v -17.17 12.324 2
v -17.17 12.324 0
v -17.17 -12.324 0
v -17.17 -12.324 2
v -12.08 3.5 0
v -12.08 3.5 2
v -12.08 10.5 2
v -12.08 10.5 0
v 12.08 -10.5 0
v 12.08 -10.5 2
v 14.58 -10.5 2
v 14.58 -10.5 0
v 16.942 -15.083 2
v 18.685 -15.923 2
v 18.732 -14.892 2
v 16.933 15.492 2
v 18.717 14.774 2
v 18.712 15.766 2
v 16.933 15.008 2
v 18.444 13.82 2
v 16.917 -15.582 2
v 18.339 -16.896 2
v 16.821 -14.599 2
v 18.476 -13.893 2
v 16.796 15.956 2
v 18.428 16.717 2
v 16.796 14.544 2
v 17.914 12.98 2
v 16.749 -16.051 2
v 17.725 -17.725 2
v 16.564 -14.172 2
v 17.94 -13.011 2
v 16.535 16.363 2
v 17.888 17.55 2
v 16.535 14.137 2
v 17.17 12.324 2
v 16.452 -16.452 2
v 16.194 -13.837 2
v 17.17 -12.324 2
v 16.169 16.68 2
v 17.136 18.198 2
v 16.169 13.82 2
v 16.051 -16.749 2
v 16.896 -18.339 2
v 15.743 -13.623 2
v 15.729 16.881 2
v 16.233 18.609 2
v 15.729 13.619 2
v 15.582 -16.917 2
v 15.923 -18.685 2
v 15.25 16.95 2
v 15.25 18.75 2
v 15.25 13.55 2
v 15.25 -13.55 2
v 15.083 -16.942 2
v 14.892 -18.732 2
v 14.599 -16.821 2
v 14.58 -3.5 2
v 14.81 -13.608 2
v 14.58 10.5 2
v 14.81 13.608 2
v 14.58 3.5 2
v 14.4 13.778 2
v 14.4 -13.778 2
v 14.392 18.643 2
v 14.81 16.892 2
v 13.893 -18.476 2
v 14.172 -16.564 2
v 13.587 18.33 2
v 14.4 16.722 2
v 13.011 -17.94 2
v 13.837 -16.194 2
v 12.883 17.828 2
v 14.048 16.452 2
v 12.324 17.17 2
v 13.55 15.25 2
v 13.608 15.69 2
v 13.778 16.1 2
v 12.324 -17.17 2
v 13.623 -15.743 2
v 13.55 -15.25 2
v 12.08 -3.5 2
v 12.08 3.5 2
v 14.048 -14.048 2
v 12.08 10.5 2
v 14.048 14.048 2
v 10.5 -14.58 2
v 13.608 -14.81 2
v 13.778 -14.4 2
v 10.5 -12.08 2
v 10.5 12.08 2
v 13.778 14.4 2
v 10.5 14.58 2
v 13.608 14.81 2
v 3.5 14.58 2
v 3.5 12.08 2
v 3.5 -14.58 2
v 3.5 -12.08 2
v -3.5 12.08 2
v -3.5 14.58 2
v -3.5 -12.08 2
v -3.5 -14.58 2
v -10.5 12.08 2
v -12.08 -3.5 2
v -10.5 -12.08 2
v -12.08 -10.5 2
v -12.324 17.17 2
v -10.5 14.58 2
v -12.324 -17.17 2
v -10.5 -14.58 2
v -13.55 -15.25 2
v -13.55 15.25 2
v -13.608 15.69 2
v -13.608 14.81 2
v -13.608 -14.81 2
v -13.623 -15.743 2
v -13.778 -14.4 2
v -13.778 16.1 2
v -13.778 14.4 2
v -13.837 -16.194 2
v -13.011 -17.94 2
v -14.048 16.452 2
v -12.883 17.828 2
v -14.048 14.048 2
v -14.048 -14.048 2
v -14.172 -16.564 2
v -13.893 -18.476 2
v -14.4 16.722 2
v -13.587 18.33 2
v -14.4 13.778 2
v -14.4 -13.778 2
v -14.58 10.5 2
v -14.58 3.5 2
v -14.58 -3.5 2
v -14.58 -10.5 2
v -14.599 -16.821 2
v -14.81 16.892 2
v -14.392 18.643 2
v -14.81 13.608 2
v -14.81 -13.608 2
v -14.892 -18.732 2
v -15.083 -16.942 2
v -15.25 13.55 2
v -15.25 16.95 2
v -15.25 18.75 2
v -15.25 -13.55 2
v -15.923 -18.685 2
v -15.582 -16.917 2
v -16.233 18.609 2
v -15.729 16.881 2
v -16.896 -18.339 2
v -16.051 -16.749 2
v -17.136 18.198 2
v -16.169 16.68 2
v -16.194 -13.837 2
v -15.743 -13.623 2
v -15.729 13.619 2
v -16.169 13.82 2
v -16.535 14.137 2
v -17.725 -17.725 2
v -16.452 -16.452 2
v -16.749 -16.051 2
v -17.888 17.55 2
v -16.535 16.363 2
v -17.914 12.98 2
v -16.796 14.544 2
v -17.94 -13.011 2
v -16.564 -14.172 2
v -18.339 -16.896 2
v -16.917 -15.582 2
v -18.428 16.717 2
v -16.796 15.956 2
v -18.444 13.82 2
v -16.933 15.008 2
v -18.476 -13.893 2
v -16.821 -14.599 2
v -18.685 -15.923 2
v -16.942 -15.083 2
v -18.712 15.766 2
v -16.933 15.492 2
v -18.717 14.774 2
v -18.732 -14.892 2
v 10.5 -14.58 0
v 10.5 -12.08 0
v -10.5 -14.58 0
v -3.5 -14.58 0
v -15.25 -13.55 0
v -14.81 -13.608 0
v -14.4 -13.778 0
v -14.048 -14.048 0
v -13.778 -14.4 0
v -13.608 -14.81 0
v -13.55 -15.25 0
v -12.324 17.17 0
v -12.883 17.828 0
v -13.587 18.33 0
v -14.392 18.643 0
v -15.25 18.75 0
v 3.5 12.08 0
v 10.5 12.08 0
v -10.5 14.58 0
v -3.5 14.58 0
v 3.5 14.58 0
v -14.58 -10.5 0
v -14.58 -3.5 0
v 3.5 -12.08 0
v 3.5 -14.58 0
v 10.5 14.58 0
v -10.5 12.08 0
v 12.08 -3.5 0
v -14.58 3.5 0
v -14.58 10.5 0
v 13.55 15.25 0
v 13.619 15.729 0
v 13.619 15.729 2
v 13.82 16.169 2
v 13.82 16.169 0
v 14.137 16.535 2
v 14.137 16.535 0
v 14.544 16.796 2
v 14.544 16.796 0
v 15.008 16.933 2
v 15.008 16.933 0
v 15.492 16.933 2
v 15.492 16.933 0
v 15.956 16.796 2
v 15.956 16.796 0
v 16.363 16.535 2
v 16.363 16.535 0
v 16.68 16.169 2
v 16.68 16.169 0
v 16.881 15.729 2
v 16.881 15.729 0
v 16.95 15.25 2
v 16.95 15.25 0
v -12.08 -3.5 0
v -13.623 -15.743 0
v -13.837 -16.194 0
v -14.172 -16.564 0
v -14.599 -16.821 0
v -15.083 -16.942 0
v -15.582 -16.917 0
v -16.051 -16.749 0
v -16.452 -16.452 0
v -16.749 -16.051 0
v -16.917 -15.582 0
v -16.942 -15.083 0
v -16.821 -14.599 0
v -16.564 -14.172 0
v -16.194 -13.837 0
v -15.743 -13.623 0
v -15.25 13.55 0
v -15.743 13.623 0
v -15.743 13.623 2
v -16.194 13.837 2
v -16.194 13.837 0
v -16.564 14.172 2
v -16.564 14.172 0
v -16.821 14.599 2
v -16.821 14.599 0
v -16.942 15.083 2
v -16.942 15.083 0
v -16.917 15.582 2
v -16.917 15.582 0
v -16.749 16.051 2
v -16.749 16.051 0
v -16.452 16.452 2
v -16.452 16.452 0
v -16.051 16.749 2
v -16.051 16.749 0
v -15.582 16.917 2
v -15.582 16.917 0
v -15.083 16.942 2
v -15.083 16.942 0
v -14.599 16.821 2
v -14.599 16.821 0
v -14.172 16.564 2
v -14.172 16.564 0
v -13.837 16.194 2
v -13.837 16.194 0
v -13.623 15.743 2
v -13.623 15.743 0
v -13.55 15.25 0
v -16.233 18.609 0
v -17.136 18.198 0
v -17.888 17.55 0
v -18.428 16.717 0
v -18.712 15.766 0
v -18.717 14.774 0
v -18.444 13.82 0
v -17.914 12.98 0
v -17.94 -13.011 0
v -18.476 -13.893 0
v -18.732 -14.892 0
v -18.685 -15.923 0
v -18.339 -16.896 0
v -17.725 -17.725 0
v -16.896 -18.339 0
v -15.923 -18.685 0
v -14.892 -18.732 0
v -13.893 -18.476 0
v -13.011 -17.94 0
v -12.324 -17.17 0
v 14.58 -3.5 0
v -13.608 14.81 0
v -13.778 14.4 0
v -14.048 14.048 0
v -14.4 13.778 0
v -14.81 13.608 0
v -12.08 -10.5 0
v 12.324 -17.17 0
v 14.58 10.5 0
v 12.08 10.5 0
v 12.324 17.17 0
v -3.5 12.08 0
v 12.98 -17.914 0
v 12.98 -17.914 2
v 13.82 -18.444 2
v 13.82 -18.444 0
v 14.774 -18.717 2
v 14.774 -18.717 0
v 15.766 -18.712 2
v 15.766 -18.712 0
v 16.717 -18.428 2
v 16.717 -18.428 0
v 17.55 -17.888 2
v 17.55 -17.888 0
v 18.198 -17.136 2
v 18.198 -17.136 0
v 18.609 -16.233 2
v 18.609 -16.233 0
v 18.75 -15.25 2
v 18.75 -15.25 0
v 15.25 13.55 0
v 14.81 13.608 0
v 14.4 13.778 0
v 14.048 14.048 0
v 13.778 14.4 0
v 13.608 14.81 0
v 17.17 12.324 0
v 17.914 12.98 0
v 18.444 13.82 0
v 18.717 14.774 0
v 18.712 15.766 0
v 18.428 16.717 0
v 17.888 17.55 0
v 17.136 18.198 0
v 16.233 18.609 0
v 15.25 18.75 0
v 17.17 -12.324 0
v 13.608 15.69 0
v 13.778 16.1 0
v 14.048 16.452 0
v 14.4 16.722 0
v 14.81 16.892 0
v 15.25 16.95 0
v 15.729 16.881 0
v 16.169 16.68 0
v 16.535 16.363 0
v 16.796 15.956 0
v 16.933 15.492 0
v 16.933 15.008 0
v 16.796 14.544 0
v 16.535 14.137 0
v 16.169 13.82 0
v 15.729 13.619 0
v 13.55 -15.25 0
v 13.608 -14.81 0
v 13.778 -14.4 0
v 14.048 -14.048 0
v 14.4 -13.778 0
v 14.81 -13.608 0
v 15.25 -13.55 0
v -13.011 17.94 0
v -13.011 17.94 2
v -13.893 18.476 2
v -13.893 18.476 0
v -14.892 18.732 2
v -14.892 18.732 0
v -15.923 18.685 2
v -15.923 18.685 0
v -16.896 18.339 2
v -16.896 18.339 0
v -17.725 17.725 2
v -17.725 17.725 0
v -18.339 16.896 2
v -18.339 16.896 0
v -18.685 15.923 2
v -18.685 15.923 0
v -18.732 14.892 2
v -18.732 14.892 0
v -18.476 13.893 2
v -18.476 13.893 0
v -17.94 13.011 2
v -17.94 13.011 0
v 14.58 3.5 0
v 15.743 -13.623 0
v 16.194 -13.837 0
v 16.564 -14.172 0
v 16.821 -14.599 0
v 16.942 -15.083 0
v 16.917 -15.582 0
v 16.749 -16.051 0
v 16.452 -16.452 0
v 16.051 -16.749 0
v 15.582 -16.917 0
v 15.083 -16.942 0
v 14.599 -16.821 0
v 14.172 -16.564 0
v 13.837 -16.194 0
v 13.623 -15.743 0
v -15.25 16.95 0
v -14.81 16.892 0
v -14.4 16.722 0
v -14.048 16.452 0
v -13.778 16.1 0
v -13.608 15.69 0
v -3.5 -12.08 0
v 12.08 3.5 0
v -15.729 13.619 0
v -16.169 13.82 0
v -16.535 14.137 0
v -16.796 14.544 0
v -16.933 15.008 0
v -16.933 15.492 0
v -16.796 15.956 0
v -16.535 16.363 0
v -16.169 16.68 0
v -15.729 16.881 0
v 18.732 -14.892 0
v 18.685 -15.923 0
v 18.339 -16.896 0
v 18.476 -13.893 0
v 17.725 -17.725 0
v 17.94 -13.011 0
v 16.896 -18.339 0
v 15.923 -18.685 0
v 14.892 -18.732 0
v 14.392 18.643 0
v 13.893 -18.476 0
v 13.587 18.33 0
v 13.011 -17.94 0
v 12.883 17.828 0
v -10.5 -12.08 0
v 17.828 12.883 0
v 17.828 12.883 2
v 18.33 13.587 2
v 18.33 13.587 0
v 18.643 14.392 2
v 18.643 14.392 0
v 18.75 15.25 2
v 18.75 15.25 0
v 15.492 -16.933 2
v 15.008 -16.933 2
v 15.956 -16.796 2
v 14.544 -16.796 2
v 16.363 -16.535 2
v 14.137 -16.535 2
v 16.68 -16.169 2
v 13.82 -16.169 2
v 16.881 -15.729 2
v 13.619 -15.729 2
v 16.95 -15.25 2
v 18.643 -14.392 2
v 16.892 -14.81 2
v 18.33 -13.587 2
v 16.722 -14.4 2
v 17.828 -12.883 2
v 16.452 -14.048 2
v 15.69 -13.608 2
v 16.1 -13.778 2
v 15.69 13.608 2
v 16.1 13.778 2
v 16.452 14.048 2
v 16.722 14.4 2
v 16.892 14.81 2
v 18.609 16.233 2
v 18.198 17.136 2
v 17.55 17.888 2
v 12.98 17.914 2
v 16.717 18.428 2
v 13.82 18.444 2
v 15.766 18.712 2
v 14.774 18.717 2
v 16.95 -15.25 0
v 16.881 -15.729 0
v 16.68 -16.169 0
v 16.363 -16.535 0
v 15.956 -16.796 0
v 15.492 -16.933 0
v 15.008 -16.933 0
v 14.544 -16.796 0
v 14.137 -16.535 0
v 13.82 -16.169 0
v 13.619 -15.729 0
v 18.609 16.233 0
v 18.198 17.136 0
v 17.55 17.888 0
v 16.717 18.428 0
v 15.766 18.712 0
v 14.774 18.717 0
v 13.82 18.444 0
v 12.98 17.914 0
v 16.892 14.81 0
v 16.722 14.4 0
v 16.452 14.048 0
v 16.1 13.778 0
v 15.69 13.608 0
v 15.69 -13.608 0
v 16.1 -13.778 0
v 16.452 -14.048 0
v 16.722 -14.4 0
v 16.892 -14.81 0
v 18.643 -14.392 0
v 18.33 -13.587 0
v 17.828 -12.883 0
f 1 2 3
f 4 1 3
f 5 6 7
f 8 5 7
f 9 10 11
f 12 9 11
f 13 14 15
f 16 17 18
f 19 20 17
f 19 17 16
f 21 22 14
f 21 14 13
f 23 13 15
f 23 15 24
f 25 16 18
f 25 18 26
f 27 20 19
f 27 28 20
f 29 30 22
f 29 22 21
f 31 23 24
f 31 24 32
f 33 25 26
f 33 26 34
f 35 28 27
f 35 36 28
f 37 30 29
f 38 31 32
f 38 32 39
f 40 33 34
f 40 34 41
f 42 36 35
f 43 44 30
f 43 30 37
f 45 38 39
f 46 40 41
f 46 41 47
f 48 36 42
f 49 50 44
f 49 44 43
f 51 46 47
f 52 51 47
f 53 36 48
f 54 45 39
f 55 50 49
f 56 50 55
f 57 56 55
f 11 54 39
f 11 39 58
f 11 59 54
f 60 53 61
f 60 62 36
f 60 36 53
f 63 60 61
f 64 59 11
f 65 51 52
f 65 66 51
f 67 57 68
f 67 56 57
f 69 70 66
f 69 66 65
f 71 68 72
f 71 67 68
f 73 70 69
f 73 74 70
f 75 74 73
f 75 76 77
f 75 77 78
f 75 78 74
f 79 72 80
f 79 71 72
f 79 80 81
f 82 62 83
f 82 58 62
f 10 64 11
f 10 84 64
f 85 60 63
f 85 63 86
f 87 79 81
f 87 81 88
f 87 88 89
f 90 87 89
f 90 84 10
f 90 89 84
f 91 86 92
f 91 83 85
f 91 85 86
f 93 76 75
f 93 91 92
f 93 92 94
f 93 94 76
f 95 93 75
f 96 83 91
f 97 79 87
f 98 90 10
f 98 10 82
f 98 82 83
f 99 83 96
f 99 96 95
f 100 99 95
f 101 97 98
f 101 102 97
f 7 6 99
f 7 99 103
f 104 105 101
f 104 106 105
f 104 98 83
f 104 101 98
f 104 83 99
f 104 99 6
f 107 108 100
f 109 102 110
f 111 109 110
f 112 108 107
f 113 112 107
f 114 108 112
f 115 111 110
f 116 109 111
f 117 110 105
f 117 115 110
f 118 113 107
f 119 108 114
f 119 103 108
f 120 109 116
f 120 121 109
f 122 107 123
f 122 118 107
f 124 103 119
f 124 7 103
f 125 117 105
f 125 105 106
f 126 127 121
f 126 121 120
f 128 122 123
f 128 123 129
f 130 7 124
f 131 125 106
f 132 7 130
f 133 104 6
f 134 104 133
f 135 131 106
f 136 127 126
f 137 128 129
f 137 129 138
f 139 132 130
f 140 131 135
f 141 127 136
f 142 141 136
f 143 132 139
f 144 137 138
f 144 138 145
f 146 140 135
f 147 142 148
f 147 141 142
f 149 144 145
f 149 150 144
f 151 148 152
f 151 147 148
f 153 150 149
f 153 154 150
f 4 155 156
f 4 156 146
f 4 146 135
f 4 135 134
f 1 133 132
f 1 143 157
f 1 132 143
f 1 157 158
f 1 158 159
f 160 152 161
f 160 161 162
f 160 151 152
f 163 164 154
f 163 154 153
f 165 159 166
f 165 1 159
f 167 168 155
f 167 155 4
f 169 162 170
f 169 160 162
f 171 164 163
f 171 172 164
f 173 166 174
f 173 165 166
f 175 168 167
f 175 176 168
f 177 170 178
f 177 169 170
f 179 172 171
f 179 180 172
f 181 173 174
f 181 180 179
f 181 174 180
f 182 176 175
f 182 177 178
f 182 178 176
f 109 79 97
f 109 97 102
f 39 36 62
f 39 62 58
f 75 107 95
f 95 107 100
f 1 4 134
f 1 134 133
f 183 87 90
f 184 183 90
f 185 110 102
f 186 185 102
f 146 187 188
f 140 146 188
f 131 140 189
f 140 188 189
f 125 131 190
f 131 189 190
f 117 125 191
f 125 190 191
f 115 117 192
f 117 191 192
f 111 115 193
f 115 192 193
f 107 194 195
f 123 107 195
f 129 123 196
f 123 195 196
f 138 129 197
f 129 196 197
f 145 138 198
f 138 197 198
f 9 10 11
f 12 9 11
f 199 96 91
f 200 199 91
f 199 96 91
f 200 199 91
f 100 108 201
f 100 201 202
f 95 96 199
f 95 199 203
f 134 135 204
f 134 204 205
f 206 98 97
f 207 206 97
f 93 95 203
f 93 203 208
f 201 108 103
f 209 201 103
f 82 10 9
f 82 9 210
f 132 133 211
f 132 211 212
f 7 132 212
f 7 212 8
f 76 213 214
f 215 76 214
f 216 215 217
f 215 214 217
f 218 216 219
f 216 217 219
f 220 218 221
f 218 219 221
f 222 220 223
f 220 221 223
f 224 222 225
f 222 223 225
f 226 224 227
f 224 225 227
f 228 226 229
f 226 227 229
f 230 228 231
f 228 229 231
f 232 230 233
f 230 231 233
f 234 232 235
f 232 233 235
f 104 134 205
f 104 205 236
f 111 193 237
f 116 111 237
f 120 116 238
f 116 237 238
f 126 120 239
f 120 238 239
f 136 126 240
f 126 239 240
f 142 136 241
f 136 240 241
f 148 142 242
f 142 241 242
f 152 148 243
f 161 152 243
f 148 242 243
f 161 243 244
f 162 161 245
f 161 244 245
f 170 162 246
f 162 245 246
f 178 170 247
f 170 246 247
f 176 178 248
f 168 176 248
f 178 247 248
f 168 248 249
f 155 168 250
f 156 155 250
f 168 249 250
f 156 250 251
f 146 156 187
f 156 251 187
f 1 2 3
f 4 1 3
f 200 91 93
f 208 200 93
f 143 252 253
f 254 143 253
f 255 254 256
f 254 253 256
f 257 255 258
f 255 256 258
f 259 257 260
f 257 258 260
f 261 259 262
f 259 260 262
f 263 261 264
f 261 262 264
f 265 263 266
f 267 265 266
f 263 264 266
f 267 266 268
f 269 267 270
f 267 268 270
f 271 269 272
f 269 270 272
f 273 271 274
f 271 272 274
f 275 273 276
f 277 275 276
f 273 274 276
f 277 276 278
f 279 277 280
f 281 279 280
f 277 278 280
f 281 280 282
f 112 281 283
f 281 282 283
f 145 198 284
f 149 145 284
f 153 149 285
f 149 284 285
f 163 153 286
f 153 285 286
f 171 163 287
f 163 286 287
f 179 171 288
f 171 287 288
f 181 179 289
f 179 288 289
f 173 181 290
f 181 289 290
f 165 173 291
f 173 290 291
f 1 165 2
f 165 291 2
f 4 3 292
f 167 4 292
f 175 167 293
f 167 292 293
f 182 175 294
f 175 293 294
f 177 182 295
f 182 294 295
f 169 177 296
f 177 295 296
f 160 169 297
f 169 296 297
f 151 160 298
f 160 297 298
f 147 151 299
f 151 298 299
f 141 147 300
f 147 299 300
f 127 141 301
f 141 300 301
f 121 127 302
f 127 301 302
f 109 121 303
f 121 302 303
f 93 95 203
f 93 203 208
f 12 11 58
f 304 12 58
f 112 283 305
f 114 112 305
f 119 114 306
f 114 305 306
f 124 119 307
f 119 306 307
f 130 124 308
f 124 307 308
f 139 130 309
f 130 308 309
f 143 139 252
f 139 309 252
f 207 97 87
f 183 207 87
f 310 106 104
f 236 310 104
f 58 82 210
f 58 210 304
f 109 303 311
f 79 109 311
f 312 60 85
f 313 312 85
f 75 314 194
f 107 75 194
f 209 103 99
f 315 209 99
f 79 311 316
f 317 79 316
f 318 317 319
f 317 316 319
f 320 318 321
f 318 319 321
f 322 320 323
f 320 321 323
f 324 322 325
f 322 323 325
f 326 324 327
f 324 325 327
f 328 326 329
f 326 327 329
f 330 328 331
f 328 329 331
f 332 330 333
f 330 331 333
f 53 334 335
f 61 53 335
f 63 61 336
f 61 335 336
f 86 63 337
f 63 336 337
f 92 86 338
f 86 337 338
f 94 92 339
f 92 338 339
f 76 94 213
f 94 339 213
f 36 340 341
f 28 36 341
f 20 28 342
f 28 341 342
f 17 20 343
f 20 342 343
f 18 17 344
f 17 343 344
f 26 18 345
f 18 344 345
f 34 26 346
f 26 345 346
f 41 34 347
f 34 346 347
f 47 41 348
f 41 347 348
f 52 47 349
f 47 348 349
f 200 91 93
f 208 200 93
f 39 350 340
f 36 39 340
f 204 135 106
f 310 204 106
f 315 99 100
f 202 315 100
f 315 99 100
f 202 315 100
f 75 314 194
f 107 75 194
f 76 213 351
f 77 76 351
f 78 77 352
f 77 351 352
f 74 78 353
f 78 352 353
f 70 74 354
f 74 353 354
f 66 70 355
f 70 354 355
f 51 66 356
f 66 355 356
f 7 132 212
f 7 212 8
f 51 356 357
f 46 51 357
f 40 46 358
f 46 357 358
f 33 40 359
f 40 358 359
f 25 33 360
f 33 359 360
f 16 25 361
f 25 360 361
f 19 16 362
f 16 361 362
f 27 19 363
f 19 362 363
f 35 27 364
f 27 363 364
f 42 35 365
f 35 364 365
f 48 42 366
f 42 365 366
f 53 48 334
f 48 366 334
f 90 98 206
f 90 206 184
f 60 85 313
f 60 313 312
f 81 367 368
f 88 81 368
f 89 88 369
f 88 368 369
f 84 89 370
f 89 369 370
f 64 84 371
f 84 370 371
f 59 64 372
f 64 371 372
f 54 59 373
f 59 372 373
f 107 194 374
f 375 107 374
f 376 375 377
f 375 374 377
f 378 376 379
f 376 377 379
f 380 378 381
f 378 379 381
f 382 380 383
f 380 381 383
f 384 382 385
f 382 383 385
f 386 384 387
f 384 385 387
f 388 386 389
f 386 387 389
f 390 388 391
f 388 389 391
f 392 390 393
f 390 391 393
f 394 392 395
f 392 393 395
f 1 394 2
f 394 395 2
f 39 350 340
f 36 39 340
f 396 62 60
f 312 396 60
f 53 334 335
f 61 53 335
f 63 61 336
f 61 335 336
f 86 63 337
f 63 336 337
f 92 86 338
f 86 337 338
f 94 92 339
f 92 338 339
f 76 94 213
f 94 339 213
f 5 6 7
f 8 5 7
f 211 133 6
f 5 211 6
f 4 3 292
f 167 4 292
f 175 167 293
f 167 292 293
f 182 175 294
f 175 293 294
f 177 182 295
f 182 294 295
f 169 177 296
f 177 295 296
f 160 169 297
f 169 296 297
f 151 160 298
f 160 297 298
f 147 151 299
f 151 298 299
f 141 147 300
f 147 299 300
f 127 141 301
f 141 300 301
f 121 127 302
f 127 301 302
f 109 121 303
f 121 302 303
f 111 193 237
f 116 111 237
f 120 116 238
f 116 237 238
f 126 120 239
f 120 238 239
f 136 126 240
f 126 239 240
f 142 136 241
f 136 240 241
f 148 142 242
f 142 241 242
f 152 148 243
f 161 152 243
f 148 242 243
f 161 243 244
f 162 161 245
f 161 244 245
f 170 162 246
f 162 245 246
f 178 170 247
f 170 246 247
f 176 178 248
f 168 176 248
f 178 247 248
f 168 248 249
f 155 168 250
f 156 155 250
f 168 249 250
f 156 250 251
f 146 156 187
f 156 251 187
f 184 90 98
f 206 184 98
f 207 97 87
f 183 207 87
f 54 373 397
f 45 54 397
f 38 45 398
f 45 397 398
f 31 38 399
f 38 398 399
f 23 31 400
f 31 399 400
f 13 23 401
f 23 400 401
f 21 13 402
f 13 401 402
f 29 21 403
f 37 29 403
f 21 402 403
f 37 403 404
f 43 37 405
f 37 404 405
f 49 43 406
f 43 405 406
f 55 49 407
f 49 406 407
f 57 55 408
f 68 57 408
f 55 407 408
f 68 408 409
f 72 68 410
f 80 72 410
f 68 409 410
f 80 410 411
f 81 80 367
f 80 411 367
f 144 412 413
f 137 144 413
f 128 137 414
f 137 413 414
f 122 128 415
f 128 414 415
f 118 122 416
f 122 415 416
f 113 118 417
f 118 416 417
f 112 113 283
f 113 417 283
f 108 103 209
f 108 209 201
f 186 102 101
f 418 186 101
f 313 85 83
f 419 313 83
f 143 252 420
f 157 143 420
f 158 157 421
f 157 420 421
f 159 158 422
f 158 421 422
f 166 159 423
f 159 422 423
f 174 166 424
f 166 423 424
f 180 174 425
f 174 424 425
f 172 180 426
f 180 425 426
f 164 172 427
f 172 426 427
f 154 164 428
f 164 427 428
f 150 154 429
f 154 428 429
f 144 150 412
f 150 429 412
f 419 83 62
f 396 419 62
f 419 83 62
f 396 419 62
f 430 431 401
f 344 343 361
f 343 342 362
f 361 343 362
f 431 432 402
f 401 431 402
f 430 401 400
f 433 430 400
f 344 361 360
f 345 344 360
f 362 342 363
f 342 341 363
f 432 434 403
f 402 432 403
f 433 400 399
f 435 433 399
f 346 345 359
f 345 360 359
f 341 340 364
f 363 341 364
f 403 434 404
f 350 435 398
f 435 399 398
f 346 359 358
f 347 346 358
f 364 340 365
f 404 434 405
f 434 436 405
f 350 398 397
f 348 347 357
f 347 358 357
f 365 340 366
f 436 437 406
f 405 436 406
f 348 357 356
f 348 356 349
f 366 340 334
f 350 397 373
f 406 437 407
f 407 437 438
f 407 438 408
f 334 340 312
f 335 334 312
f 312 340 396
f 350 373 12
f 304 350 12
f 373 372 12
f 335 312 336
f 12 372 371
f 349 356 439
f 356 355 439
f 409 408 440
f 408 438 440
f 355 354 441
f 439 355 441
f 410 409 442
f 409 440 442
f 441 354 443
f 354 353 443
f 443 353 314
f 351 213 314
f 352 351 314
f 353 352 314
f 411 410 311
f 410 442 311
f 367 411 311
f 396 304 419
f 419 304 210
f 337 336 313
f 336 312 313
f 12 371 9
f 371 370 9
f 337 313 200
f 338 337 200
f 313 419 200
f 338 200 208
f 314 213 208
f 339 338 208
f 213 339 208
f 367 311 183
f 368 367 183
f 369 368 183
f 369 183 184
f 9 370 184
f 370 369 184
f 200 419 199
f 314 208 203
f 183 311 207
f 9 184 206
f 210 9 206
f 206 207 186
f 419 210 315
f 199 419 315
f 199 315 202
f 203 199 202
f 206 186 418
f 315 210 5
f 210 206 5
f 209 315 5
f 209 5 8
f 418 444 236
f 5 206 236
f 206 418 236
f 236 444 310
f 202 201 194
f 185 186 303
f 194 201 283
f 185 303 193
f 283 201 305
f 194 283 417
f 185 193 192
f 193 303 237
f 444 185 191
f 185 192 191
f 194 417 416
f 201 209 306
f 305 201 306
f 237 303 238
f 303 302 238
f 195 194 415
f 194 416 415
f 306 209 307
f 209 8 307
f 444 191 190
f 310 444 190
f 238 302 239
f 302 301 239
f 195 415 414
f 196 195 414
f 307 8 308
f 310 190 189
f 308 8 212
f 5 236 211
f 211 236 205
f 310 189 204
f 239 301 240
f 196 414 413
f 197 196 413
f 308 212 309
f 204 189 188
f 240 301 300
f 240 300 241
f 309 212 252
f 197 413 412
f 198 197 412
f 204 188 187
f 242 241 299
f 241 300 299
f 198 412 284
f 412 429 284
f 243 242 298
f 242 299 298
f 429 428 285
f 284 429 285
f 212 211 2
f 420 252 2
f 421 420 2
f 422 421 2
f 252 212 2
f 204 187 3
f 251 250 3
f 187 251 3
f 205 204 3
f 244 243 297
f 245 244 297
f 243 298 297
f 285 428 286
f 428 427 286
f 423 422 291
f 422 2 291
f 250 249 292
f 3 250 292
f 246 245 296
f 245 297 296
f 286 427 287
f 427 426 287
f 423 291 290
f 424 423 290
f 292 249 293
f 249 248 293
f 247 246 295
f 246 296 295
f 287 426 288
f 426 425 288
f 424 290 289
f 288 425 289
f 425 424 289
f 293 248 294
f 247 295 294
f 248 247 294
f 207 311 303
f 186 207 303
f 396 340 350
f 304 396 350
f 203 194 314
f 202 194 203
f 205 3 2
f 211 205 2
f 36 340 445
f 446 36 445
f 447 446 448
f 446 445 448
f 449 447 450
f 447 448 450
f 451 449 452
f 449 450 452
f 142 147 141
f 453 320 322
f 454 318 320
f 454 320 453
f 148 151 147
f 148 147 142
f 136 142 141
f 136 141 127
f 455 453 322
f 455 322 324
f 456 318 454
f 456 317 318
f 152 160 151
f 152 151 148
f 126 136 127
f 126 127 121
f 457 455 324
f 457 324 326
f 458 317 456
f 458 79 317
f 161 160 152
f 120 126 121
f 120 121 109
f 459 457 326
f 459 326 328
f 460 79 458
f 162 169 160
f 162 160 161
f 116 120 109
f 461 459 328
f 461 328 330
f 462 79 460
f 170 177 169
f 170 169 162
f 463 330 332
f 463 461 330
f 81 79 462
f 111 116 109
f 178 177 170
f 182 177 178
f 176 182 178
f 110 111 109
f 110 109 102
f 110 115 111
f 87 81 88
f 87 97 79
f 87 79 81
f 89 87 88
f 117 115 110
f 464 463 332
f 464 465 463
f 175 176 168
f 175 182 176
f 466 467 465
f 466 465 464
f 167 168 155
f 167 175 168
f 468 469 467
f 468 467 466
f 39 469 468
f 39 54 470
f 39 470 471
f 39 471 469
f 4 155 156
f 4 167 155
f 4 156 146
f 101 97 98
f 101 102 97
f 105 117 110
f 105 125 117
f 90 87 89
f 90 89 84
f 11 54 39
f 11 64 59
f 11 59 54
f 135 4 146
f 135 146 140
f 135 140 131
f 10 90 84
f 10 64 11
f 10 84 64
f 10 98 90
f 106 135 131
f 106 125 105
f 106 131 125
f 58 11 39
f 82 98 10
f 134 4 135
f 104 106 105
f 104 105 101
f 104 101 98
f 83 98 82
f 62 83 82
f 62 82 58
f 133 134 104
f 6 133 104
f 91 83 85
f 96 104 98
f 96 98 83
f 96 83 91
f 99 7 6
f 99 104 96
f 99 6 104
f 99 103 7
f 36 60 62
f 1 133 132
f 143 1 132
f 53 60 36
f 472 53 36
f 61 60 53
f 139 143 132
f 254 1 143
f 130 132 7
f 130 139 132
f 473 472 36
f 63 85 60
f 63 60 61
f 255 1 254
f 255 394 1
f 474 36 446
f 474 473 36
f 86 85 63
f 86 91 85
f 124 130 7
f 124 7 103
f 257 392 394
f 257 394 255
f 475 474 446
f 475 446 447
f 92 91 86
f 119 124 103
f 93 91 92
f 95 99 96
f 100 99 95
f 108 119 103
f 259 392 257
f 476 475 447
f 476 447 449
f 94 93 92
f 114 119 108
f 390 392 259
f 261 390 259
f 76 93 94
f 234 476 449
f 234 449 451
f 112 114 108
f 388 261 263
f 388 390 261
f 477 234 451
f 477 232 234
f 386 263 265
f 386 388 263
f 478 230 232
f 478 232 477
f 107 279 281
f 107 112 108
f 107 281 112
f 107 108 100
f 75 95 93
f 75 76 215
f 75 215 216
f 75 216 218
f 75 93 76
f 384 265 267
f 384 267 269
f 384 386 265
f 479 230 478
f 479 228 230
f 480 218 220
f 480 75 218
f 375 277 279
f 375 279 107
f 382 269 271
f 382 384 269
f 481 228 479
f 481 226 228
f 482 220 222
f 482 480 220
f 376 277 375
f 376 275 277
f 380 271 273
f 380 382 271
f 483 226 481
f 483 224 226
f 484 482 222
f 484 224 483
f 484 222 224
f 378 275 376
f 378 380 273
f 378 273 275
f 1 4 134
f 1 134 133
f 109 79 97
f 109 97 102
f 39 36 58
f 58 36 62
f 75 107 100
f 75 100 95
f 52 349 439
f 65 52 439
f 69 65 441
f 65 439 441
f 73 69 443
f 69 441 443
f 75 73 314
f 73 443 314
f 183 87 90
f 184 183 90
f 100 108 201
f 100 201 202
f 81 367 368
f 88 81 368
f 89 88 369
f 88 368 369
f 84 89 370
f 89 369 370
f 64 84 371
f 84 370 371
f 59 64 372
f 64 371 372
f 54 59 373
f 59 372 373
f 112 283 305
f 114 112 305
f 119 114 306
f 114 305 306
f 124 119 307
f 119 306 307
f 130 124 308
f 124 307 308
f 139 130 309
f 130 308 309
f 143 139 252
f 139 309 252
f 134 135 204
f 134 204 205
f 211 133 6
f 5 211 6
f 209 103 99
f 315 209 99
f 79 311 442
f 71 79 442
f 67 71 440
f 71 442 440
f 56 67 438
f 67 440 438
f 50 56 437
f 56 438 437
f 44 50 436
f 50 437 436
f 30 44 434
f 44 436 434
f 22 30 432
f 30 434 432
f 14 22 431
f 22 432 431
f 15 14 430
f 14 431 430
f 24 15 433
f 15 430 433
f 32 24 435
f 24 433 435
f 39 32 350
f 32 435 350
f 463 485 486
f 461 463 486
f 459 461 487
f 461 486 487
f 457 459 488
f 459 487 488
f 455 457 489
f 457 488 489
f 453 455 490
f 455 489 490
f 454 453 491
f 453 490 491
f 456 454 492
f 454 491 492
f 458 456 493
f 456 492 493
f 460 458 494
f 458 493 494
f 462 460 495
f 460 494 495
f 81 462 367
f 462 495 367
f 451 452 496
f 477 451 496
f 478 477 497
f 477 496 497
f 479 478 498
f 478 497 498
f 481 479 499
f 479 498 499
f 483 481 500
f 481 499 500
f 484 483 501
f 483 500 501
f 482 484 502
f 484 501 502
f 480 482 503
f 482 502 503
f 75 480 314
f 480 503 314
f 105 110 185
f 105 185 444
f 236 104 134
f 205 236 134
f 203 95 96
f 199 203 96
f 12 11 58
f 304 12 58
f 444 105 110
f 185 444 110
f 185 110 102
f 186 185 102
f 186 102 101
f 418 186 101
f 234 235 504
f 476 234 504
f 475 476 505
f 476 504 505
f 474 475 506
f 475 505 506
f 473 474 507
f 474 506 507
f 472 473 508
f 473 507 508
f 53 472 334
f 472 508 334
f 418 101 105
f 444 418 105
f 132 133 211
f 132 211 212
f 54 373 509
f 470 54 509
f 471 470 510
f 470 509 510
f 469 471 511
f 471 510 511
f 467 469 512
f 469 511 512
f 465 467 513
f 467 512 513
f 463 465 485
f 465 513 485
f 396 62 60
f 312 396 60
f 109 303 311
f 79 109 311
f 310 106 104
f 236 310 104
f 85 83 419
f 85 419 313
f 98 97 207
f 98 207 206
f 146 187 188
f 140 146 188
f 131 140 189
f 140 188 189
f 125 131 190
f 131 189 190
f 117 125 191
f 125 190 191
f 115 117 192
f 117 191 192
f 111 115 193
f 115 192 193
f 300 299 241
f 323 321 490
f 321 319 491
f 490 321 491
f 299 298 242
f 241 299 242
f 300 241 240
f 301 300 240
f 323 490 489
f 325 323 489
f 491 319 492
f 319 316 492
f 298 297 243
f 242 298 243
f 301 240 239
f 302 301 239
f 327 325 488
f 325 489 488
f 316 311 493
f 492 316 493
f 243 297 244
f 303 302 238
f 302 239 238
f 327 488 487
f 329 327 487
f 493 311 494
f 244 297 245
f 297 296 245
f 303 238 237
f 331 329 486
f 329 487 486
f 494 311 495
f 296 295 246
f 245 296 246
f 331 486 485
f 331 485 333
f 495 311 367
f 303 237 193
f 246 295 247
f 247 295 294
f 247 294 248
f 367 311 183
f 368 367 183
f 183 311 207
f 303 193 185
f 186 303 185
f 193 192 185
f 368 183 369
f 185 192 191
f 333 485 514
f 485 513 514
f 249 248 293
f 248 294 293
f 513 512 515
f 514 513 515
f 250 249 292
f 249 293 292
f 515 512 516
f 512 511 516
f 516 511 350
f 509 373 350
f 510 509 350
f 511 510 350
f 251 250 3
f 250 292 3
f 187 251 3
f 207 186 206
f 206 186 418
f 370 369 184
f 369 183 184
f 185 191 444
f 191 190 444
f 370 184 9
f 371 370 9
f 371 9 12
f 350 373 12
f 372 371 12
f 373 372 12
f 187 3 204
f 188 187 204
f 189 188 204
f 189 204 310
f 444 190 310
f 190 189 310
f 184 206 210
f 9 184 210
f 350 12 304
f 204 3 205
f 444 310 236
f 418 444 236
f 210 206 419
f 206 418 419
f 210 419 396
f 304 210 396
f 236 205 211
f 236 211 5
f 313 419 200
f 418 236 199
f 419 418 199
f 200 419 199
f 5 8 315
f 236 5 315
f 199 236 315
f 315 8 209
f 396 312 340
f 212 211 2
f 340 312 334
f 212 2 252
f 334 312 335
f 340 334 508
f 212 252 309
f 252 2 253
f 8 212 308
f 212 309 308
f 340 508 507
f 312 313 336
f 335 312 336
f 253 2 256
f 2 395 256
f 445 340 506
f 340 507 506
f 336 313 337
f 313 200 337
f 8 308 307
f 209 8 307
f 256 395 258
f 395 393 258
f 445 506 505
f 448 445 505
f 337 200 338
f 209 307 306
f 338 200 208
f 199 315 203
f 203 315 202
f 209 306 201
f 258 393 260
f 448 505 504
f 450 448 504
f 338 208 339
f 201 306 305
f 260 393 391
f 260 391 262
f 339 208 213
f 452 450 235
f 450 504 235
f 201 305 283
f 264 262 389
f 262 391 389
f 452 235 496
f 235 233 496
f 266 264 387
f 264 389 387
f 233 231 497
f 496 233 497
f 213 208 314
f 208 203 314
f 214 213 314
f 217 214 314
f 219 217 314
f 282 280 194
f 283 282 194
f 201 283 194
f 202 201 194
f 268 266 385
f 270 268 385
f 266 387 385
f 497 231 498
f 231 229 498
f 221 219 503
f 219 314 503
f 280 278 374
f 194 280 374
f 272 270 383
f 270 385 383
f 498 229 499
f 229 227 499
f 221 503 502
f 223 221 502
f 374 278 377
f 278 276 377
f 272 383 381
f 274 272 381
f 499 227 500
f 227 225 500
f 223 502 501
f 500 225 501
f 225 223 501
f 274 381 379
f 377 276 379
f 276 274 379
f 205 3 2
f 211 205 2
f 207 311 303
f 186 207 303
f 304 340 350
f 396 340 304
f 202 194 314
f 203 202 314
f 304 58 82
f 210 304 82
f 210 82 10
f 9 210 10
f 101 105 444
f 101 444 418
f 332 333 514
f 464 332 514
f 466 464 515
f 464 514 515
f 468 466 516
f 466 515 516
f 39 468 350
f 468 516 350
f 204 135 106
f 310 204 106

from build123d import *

# Parameters (mm, degrees)
F2_DEPTH  = 2
F4_ANGLE  = 45
F8_R      = 1.7
F9_DEPTH  = 2.001
F10_W     = 7
F10_H     = 1.25
F11_DEPTH = 2.001
F12_ANGLE = 90
F13_W     = 7
F13_H     = 2.5
F13_W_2   = 2.5
F13_H_2   = 7
F14_DEPTH = 2.001


# Not quite as in the source:
# - a feature names something its author has since deleted; it is built from what else it names


with BuildPart() as f2:
    # F1 (on Top) → F2 (new body)
    with BuildSketch(Plane.XY):
        with BuildLine():
            ThreePointArc((-12.3236370697, 17.17), (-17.7248737342, 17.7248737342), (-17.17, 12.3236370697))
            ThreePointArc((-17.17, 12.3236370697), (-16.2519305724, 11.8964742243), (-15.25, 11.75))
            Line((-15.25, 11.75), (-15.25, 13.55))
            ThreePointArc((-15.25, 13.55), (-16.452081528, 16.452081528), (-13.55, 15.25))
            Line((-13.55, 15.25), (-11.75, 15.25))
            ThreePointArc((-11.75, 15.25), (-11.8964742243, 16.2519305724), (-12.3236370697, 17.17))
        make_face()
        with BuildLine():
            ThreePointArc((-15.25, 11.75), (-14.2480694276, 11.8964742243), (-13.33, 12.3236370697))
            ThreePointArc((-13.33, 12.3236370697), (-12.7751262658, 12.7751262658), (-12.3236370697, 13.33))
            ThreePointArc((-12.3236370697, 13.33), (-11.8964742243, 14.2480694276), (-11.75, 15.25))
            Line((-11.75, 15.25), (-13.55, 15.25))
            ThreePointArc((-13.55, 15.25), (-14.047918472, 14.047918472), (-15.25, 13.55))
            Line((-15.25, 13.55), (-15.25, 11.75))
        make_face()
        with BuildLine():
            Line((15.25, 13.55), (15.25, 11.75))
            ThreePointArc((15.25, 11.75), (16.2519305724, 11.8964742243), (17.17, 12.3236370697))
            ThreePointArc((17.17, 12.3236370697), (18.3297727189, 13.5871710852), (18.75, 15.25))
            ThreePointArc((18.75, 15.25), (16.2519305724, 18.6035257757), (12.3236370697, 17.17))
            ThreePointArc((12.3236370697, 17.17), (11.8964742243, 16.2519305724), (11.75, 15.25))
            Line((11.75, 15.25), (13.55, 15.25))
            ThreePointArc((13.55, 15.25), (15.25, 16.95), (16.95, 15.25))
            ThreePointArc((16.95, 15.25), (16.452081528, 14.047918472), (15.25, 13.55))
        make_face()
        with BuildLine():
            ThreePointArc((12.3236370697, 13.33), (12.7751262658, 12.7751262658), (13.33, 12.3236370697))
            ThreePointArc((13.33, 12.3236370697), (14.2480694276, 11.8964742243), (15.25, 11.75))
            Line((15.25, 11.75), (15.25, 13.55))
            ThreePointArc((15.25, 13.55), (14.047918472, 14.047918472), (13.55, 15.25))
            Line((13.55, 15.25), (11.75, 15.25))
            ThreePointArc((11.75, 15.25), (11.8964742243, 14.2480694276), (12.3236370697, 13.33))
        make_face()
        with BuildLine():
            Line((13.33, 12.3236370697), (13.33, -12.3236370697))
            ThreePointArc((13.33, -12.3236370697), (14.2480694276, -11.8964742243), (15.25, -11.75))
            Line((15.25, -11.75), (15.25, 11.75))
            ThreePointArc((15.25, 11.75), (14.2480694276, 11.8964742243), (13.33, 12.3236370697))
        make_face()
        with BuildLine():
            ThreePointArc((-11.75, 15.25), (-11.8964742243, 14.2480694276), (-12.3236370697, 13.33))
            Line((-12.3236370697, 13.33), (12.3236370697, 13.33))
            ThreePointArc((12.3236370697, 13.33), (11.8964742243, 14.2480694276), (11.75, 15.25))
            Line((11.75, 15.25), (-11.75, 15.25))
        make_face()
        with BuildLine():
            ThreePointArc((-15.25, -11.75), (-14.2480694276, -11.8964742243), (-13.33, -12.3236370697))
            Line((-13.33, -12.3236370697), (-13.33, 12.3236370697))
            ThreePointArc((-13.33, 12.3236370697), (-14.2480694276, 11.8964742243), (-15.25, 11.75))
            Line((-15.25, 11.75), (-15.25, -11.75))
        make_face()
        with BuildLine():
            Line((-17.17, 12.3236370697), (-17.17, -12.3236370697))
            ThreePointArc((-17.17, -12.3236370697), (-16.2519305724, -11.8964742243), (-15.25, -11.75))
            Line((-15.25, -11.75), (-15.25, 11.75))
            ThreePointArc((-15.25, 11.75), (-16.2519305724, 11.8964742243), (-17.17, 12.3236370697))
        make_face()
        with BuildLine():
            Line((15.25, 11.75), (15.25, -11.75))
            ThreePointArc((15.25, -11.75), (16.2519305724, -11.8964742243), (17.17, -12.3236370697))
            Line((17.17, -12.3236370697), (17.17, 12.3236370697))
            ThreePointArc((17.17, 12.3236370697), (16.2519305724, 11.8964742243), (15.25, 11.75))
        make_face()
        with BuildLine():
            ThreePointArc((-12.3236370697, -13.33), (-11.8964742243, -14.2480694276), (-11.75, -15.25))
            Line((-11.75, -15.25), (11.75, -15.25))
            ThreePointArc((11.75, -15.25), (11.8964742243, -14.2480694276), (12.3236370697, -13.33))
            Line((12.3236370697, -13.33), (-12.3236370697, -13.33))
        make_face()
        with BuildLine():
            Line((11.75, -15.25), (-11.75, -15.25))
            ThreePointArc((-11.75, -15.25), (-11.8964742243, -16.2519305724), (-12.3236370697, -17.17))
            Line((-12.3236370697, -17.17), (12.3236370697, -17.17))
            ThreePointArc((12.3236370697, -17.17), (11.8964742243, -16.2519305724), (11.75, -15.25))
        make_face()
        with BuildLine():
            Line((12.3236370697, 17.17), (-12.3236370697, 17.17))
            ThreePointArc((-12.3236370697, 17.17), (-11.8964742243, 16.2519305724), (-11.75, 15.25))
            Line((-11.75, 15.25), (11.75, 15.25))
            ThreePointArc((11.75, 15.25), (11.8964742243, 16.2519305724), (12.3236370697, 17.17))
        make_face()
        with BuildLine():
            ThreePointArc((-12.3236370697, -17.17), (-11.8964742243, -16.2519305724), (-11.75, -15.25))
            Line((-11.75, -15.25), (-13.55, -15.25))
            ThreePointArc((-13.55, -15.25), (-16.452081528, -16.452081528), (-15.25, -13.55))
            Line((-15.25, -13.55), (-15.25, -11.75))
            ThreePointArc((-15.25, -11.75), (-16.2519305724, -11.8964742243), (-17.17, -12.3236370697))
            ThreePointArc((-17.17, -12.3236370697), (-17.7248737342, -17.7248737342), (-12.3236370697, -17.17))
        make_face()
        with BuildLine():
            Line((-13.55, -15.25), (-11.75, -15.25))
            ThreePointArc((-11.75, -15.25), (-11.8964742243, -14.2480694276), (-12.3236370697, -13.33))
            ThreePointArc((-12.3236370697, -13.33), (-12.7751262658, -12.7751262658), (-13.33, -12.3236370697))
            ThreePointArc((-13.33, -12.3236370697), (-14.2480694276, -11.8964742243), (-15.25, -11.75))
            Line((-15.25, -11.75), (-15.25, -13.55))
            ThreePointArc((-15.25, -13.55), (-14.047918472, -14.047918472), (-13.55, -15.25))
        make_face()
        with BuildLine():
            ThreePointArc((12.3236370697, -13.33), (11.8964742243, -14.2480694276), (11.75, -15.25))
            Line((11.75, -15.25), (13.55, -15.25))
            ThreePointArc((13.55, -15.25), (14.047918472, -14.047918472), (15.25, -13.55))
            Line((15.25, -13.55), (15.25, -11.75))
            ThreePointArc((15.25, -11.75), (14.2480694276, -11.8964742243), (13.33, -12.3236370697))
            ThreePointArc((13.33, -12.3236370697), (12.7751262658, -12.7751262658), (12.3236370697, -13.33))
        make_face()
        with BuildLine():
            Line((13.55, -15.25), (11.75, -15.25))
            ThreePointArc((11.75, -15.25), (11.8964742243, -16.2519305724), (12.3236370697, -17.17))
            ThreePointArc((12.3236370697, -17.17), (16.2519305724, -18.6035257757), (18.75, -15.25))
            ThreePointArc((18.75, -15.25), (18.3297727189, -13.5871710852), (17.17, -12.3236370697))
            ThreePointArc((17.17, -12.3236370697), (16.2519305724, -11.8964742243), (15.25, -11.75))
            Line((15.25, -11.75), (15.25, -13.55))
            ThreePointArc((15.25, -13.55), (16.452081528, -14.047918472), (16.95, -15.25))
            ThreePointArc((16.95, -15.25), (15.25, -16.95), (13.55, -15.25))
        make_face()
        with BuildLine():
            ThreePointArc((-13.33, -12.3236370697), (-12.7751262658, -12.7751262658), (-12.3236370697, -13.33))
            Line((-12.3236370697, -13.33), (12.3236370697, -13.33))
            ThreePointArc((12.3236370697, -13.33), (12.7751262658, -12.7751262658), (13.33, -12.3236370697))
            Line((13.33, -12.3236370697), (13.33, 12.3236370697))
            ThreePointArc((13.33, 12.3236370697), (12.7751262658, 12.7751262658), (12.3236370697, 13.33))
            Line((12.3236370697, 13.33), (-12.3236370697, 13.33))
            ThreePointArc((-12.3236370697, 13.33), (-12.7751262658, 12.7751262658), (-13.33, 12.3236370697))
            Line((-13.33, 12.3236370697), (-13.33, -12.3236370697))
        make_face()
    extrude(amount=F2_DEPTH)


with BuildPart() as f4_1:
    # F4: copy of F2
    add(f2.part.rotate(Axis((0, 0, 43.582893908), (0, 0, 1)), F4_ANGLE))


with BuildPart() as f2_1:
    add(f2.part)

    # F5: union F4_1
    add(f4_1.part)

    # F8 (on face) → F9 (cut, through all)
    with BuildSketch(Plane.XY.offset(2)):
        with BuildLine():
            Line((-3.4268960921, 20.8551507738), (-7.1120468659, 17.17))
            Line((-7.1120468659, 17.17), (7.1120468659, 17.17))
            Line((7.1120468659, 17.17), (3.4268960921, 20.8551507738))
            ThreePointArc((3.4268960921, 20.8551507738), (0, 25.0667568262), (-3.4268960921, 20.8551507738))
        make_face()
        with Locations((0, 21.5667568262)):
            Circle(F8_R, mode=Mode.SUBTRACT)
        with BuildLine():
            Line((20.8551507738, 3.4268960921), (17.17, 7.1120468659))
            Line((17.17, 7.1120468659), (17.17, -7.1120468659))
            Line((17.17, -7.1120468659), (20.8551507738, -3.4268960921))
            ThreePointArc((20.8551507738, -3.4268960921), (25.0667568262, 0), (20.8551507738, 3.4268960921))
        make_face()
        with Locations((21.5667568262, 0)):
            Circle(F8_R, mode=Mode.SUBTRACT)
        with BuildLine():
            Line((7.1120468659, -17.17), (-7.1120468659, -17.17))
            Line((-7.1120468659, -17.17), (-3.4268960921, -20.8551507738))
            ThreePointArc((-3.4268960921, -20.8551507738), (0, -25.0667568262), (3.4268960921, -20.8551507738))
            Line((3.4268960921, -20.8551507738), (7.1120468659, -17.17))
        make_face()
        with Locations((0, -21.5667568262)):
            Circle(F8_R, mode=Mode.SUBTRACT)
        with BuildLine():
            Line((-17.17, -7.1120468659), (-17.17, 7.1120468659))
            Line((-17.17, 7.1120468659), (-20.8551507738, 3.4268960921))
            ThreePointArc((-20.8551507738, 3.4268960921), (-25.0667568262, 0), (-20.8551507738, -3.4268960921))
            Line((-20.8551507738, -3.4268960921), (-17.17, -7.1120468659))
        make_face()
        with Locations((-21.5667568262, 0)):
            Circle(F8_R, mode=Mode.SUBTRACT)
    extrude(amount=-F9_DEPTH, mode=Mode.SUBTRACT)

    # F10 (on face) → F11 (cut, through all)
    with BuildSketch(Plane.XY.offset(2)):
        Polygon((-9.3647099602, 12.08), (-3.5, 12.08), (-3.5, 13.33), (-10.5, 13.33), (-10.5, 13.2152900398), align=None)
        Polygon((-10.5, 12.08), (-9.3647099602, 12.08), (-10.5, 13.2152900398), align=None)
        with Locations((-7, 13.955)):
            Rectangle(F10_W, F10_H)
        Polygon((10.5, 13.33), (3.5, 13.33), (3.5, 12.08), (9.3647099602, 12.08), (10.5, 13.2152900398), align=None)
        with Locations((7, 13.955)):
            Rectangle(F10_W, F10_H)
        Polygon((10.5, -13.2152900398), (10.5, -12.08), (9.3647099602, -12.08), align=None)
        Polygon((10.5, -13.33), (10.5, -13.2152900398), (9.3647099602, -12.08), (3.5, -12.08), (3.5, -13.33), align=None)
        with Locations((7, -13.955)):
            Rectangle(F10_W, F10_H)
        Polygon((-10.5, -13.33), (-3.5, -13.33), (-3.5, -12.08), (-9.3647099602, -12.08), (-10.5, -13.2152900398), align=None)
        with Locations((-7, -13.955)):
            Rectangle(F10_W, F10_H)
        Polygon((-10.5, -13.2152900398), (-9.3647099602, -12.08), (-10.5, -12.08), align=None)
    extrude(amount=-F11_DEPTH, mode=Mode.SUBTRACT)


with BuildPart() as f12_1:
    # F12: copy of F2
    add(f2_1.part.rotate(Axis((0, 0, 43.582893908), (0, 0, 1)), F12_ANGLE))


with BuildPart() as f14_tool:
    # F13 (on face) → F14 (new body, through all)
    with BuildSketch(Plane.XY.offset(2)):
        with Locations((-7, 13.33)):
            Rectangle(F13_W, F13_H)
        with Locations((-13.33, 7)):
            Rectangle(F13_W_2, F13_H_2)
        with Locations((7, 13.33)):
            Rectangle(F13_W, F13_H)
        with Locations((13.33, 7)):
            Rectangle(F13_W_2, F13_H_2)
        with Locations((-13.33, -7)):
            Rectangle(F13_W_2, F13_H_2)
        with Locations((13.33, -7)):
            Rectangle(F13_W_2, F13_H_2)
        with Locations((7, -13.33)):
            Rectangle(F13_W, F13_H)
        with Locations((-7, -13.33)):
            Rectangle(F13_W, F13_H)
    extrude(amount=-F14_DEPTH)


with BuildPart() as f2_2:
    add(f2_1.part)

    # F14: cut by f14_tool
    add(f14_tool.part, mode=Mode.SUBTRACT)


with BuildPart() as f12_1_1:
    add(f12_1.part)

    # F14: cut by f14_tool
    add(f14_tool.part, mode=Mode.SUBTRACT)


solid = Compound([f2_2.part, f12_1_1.part])
